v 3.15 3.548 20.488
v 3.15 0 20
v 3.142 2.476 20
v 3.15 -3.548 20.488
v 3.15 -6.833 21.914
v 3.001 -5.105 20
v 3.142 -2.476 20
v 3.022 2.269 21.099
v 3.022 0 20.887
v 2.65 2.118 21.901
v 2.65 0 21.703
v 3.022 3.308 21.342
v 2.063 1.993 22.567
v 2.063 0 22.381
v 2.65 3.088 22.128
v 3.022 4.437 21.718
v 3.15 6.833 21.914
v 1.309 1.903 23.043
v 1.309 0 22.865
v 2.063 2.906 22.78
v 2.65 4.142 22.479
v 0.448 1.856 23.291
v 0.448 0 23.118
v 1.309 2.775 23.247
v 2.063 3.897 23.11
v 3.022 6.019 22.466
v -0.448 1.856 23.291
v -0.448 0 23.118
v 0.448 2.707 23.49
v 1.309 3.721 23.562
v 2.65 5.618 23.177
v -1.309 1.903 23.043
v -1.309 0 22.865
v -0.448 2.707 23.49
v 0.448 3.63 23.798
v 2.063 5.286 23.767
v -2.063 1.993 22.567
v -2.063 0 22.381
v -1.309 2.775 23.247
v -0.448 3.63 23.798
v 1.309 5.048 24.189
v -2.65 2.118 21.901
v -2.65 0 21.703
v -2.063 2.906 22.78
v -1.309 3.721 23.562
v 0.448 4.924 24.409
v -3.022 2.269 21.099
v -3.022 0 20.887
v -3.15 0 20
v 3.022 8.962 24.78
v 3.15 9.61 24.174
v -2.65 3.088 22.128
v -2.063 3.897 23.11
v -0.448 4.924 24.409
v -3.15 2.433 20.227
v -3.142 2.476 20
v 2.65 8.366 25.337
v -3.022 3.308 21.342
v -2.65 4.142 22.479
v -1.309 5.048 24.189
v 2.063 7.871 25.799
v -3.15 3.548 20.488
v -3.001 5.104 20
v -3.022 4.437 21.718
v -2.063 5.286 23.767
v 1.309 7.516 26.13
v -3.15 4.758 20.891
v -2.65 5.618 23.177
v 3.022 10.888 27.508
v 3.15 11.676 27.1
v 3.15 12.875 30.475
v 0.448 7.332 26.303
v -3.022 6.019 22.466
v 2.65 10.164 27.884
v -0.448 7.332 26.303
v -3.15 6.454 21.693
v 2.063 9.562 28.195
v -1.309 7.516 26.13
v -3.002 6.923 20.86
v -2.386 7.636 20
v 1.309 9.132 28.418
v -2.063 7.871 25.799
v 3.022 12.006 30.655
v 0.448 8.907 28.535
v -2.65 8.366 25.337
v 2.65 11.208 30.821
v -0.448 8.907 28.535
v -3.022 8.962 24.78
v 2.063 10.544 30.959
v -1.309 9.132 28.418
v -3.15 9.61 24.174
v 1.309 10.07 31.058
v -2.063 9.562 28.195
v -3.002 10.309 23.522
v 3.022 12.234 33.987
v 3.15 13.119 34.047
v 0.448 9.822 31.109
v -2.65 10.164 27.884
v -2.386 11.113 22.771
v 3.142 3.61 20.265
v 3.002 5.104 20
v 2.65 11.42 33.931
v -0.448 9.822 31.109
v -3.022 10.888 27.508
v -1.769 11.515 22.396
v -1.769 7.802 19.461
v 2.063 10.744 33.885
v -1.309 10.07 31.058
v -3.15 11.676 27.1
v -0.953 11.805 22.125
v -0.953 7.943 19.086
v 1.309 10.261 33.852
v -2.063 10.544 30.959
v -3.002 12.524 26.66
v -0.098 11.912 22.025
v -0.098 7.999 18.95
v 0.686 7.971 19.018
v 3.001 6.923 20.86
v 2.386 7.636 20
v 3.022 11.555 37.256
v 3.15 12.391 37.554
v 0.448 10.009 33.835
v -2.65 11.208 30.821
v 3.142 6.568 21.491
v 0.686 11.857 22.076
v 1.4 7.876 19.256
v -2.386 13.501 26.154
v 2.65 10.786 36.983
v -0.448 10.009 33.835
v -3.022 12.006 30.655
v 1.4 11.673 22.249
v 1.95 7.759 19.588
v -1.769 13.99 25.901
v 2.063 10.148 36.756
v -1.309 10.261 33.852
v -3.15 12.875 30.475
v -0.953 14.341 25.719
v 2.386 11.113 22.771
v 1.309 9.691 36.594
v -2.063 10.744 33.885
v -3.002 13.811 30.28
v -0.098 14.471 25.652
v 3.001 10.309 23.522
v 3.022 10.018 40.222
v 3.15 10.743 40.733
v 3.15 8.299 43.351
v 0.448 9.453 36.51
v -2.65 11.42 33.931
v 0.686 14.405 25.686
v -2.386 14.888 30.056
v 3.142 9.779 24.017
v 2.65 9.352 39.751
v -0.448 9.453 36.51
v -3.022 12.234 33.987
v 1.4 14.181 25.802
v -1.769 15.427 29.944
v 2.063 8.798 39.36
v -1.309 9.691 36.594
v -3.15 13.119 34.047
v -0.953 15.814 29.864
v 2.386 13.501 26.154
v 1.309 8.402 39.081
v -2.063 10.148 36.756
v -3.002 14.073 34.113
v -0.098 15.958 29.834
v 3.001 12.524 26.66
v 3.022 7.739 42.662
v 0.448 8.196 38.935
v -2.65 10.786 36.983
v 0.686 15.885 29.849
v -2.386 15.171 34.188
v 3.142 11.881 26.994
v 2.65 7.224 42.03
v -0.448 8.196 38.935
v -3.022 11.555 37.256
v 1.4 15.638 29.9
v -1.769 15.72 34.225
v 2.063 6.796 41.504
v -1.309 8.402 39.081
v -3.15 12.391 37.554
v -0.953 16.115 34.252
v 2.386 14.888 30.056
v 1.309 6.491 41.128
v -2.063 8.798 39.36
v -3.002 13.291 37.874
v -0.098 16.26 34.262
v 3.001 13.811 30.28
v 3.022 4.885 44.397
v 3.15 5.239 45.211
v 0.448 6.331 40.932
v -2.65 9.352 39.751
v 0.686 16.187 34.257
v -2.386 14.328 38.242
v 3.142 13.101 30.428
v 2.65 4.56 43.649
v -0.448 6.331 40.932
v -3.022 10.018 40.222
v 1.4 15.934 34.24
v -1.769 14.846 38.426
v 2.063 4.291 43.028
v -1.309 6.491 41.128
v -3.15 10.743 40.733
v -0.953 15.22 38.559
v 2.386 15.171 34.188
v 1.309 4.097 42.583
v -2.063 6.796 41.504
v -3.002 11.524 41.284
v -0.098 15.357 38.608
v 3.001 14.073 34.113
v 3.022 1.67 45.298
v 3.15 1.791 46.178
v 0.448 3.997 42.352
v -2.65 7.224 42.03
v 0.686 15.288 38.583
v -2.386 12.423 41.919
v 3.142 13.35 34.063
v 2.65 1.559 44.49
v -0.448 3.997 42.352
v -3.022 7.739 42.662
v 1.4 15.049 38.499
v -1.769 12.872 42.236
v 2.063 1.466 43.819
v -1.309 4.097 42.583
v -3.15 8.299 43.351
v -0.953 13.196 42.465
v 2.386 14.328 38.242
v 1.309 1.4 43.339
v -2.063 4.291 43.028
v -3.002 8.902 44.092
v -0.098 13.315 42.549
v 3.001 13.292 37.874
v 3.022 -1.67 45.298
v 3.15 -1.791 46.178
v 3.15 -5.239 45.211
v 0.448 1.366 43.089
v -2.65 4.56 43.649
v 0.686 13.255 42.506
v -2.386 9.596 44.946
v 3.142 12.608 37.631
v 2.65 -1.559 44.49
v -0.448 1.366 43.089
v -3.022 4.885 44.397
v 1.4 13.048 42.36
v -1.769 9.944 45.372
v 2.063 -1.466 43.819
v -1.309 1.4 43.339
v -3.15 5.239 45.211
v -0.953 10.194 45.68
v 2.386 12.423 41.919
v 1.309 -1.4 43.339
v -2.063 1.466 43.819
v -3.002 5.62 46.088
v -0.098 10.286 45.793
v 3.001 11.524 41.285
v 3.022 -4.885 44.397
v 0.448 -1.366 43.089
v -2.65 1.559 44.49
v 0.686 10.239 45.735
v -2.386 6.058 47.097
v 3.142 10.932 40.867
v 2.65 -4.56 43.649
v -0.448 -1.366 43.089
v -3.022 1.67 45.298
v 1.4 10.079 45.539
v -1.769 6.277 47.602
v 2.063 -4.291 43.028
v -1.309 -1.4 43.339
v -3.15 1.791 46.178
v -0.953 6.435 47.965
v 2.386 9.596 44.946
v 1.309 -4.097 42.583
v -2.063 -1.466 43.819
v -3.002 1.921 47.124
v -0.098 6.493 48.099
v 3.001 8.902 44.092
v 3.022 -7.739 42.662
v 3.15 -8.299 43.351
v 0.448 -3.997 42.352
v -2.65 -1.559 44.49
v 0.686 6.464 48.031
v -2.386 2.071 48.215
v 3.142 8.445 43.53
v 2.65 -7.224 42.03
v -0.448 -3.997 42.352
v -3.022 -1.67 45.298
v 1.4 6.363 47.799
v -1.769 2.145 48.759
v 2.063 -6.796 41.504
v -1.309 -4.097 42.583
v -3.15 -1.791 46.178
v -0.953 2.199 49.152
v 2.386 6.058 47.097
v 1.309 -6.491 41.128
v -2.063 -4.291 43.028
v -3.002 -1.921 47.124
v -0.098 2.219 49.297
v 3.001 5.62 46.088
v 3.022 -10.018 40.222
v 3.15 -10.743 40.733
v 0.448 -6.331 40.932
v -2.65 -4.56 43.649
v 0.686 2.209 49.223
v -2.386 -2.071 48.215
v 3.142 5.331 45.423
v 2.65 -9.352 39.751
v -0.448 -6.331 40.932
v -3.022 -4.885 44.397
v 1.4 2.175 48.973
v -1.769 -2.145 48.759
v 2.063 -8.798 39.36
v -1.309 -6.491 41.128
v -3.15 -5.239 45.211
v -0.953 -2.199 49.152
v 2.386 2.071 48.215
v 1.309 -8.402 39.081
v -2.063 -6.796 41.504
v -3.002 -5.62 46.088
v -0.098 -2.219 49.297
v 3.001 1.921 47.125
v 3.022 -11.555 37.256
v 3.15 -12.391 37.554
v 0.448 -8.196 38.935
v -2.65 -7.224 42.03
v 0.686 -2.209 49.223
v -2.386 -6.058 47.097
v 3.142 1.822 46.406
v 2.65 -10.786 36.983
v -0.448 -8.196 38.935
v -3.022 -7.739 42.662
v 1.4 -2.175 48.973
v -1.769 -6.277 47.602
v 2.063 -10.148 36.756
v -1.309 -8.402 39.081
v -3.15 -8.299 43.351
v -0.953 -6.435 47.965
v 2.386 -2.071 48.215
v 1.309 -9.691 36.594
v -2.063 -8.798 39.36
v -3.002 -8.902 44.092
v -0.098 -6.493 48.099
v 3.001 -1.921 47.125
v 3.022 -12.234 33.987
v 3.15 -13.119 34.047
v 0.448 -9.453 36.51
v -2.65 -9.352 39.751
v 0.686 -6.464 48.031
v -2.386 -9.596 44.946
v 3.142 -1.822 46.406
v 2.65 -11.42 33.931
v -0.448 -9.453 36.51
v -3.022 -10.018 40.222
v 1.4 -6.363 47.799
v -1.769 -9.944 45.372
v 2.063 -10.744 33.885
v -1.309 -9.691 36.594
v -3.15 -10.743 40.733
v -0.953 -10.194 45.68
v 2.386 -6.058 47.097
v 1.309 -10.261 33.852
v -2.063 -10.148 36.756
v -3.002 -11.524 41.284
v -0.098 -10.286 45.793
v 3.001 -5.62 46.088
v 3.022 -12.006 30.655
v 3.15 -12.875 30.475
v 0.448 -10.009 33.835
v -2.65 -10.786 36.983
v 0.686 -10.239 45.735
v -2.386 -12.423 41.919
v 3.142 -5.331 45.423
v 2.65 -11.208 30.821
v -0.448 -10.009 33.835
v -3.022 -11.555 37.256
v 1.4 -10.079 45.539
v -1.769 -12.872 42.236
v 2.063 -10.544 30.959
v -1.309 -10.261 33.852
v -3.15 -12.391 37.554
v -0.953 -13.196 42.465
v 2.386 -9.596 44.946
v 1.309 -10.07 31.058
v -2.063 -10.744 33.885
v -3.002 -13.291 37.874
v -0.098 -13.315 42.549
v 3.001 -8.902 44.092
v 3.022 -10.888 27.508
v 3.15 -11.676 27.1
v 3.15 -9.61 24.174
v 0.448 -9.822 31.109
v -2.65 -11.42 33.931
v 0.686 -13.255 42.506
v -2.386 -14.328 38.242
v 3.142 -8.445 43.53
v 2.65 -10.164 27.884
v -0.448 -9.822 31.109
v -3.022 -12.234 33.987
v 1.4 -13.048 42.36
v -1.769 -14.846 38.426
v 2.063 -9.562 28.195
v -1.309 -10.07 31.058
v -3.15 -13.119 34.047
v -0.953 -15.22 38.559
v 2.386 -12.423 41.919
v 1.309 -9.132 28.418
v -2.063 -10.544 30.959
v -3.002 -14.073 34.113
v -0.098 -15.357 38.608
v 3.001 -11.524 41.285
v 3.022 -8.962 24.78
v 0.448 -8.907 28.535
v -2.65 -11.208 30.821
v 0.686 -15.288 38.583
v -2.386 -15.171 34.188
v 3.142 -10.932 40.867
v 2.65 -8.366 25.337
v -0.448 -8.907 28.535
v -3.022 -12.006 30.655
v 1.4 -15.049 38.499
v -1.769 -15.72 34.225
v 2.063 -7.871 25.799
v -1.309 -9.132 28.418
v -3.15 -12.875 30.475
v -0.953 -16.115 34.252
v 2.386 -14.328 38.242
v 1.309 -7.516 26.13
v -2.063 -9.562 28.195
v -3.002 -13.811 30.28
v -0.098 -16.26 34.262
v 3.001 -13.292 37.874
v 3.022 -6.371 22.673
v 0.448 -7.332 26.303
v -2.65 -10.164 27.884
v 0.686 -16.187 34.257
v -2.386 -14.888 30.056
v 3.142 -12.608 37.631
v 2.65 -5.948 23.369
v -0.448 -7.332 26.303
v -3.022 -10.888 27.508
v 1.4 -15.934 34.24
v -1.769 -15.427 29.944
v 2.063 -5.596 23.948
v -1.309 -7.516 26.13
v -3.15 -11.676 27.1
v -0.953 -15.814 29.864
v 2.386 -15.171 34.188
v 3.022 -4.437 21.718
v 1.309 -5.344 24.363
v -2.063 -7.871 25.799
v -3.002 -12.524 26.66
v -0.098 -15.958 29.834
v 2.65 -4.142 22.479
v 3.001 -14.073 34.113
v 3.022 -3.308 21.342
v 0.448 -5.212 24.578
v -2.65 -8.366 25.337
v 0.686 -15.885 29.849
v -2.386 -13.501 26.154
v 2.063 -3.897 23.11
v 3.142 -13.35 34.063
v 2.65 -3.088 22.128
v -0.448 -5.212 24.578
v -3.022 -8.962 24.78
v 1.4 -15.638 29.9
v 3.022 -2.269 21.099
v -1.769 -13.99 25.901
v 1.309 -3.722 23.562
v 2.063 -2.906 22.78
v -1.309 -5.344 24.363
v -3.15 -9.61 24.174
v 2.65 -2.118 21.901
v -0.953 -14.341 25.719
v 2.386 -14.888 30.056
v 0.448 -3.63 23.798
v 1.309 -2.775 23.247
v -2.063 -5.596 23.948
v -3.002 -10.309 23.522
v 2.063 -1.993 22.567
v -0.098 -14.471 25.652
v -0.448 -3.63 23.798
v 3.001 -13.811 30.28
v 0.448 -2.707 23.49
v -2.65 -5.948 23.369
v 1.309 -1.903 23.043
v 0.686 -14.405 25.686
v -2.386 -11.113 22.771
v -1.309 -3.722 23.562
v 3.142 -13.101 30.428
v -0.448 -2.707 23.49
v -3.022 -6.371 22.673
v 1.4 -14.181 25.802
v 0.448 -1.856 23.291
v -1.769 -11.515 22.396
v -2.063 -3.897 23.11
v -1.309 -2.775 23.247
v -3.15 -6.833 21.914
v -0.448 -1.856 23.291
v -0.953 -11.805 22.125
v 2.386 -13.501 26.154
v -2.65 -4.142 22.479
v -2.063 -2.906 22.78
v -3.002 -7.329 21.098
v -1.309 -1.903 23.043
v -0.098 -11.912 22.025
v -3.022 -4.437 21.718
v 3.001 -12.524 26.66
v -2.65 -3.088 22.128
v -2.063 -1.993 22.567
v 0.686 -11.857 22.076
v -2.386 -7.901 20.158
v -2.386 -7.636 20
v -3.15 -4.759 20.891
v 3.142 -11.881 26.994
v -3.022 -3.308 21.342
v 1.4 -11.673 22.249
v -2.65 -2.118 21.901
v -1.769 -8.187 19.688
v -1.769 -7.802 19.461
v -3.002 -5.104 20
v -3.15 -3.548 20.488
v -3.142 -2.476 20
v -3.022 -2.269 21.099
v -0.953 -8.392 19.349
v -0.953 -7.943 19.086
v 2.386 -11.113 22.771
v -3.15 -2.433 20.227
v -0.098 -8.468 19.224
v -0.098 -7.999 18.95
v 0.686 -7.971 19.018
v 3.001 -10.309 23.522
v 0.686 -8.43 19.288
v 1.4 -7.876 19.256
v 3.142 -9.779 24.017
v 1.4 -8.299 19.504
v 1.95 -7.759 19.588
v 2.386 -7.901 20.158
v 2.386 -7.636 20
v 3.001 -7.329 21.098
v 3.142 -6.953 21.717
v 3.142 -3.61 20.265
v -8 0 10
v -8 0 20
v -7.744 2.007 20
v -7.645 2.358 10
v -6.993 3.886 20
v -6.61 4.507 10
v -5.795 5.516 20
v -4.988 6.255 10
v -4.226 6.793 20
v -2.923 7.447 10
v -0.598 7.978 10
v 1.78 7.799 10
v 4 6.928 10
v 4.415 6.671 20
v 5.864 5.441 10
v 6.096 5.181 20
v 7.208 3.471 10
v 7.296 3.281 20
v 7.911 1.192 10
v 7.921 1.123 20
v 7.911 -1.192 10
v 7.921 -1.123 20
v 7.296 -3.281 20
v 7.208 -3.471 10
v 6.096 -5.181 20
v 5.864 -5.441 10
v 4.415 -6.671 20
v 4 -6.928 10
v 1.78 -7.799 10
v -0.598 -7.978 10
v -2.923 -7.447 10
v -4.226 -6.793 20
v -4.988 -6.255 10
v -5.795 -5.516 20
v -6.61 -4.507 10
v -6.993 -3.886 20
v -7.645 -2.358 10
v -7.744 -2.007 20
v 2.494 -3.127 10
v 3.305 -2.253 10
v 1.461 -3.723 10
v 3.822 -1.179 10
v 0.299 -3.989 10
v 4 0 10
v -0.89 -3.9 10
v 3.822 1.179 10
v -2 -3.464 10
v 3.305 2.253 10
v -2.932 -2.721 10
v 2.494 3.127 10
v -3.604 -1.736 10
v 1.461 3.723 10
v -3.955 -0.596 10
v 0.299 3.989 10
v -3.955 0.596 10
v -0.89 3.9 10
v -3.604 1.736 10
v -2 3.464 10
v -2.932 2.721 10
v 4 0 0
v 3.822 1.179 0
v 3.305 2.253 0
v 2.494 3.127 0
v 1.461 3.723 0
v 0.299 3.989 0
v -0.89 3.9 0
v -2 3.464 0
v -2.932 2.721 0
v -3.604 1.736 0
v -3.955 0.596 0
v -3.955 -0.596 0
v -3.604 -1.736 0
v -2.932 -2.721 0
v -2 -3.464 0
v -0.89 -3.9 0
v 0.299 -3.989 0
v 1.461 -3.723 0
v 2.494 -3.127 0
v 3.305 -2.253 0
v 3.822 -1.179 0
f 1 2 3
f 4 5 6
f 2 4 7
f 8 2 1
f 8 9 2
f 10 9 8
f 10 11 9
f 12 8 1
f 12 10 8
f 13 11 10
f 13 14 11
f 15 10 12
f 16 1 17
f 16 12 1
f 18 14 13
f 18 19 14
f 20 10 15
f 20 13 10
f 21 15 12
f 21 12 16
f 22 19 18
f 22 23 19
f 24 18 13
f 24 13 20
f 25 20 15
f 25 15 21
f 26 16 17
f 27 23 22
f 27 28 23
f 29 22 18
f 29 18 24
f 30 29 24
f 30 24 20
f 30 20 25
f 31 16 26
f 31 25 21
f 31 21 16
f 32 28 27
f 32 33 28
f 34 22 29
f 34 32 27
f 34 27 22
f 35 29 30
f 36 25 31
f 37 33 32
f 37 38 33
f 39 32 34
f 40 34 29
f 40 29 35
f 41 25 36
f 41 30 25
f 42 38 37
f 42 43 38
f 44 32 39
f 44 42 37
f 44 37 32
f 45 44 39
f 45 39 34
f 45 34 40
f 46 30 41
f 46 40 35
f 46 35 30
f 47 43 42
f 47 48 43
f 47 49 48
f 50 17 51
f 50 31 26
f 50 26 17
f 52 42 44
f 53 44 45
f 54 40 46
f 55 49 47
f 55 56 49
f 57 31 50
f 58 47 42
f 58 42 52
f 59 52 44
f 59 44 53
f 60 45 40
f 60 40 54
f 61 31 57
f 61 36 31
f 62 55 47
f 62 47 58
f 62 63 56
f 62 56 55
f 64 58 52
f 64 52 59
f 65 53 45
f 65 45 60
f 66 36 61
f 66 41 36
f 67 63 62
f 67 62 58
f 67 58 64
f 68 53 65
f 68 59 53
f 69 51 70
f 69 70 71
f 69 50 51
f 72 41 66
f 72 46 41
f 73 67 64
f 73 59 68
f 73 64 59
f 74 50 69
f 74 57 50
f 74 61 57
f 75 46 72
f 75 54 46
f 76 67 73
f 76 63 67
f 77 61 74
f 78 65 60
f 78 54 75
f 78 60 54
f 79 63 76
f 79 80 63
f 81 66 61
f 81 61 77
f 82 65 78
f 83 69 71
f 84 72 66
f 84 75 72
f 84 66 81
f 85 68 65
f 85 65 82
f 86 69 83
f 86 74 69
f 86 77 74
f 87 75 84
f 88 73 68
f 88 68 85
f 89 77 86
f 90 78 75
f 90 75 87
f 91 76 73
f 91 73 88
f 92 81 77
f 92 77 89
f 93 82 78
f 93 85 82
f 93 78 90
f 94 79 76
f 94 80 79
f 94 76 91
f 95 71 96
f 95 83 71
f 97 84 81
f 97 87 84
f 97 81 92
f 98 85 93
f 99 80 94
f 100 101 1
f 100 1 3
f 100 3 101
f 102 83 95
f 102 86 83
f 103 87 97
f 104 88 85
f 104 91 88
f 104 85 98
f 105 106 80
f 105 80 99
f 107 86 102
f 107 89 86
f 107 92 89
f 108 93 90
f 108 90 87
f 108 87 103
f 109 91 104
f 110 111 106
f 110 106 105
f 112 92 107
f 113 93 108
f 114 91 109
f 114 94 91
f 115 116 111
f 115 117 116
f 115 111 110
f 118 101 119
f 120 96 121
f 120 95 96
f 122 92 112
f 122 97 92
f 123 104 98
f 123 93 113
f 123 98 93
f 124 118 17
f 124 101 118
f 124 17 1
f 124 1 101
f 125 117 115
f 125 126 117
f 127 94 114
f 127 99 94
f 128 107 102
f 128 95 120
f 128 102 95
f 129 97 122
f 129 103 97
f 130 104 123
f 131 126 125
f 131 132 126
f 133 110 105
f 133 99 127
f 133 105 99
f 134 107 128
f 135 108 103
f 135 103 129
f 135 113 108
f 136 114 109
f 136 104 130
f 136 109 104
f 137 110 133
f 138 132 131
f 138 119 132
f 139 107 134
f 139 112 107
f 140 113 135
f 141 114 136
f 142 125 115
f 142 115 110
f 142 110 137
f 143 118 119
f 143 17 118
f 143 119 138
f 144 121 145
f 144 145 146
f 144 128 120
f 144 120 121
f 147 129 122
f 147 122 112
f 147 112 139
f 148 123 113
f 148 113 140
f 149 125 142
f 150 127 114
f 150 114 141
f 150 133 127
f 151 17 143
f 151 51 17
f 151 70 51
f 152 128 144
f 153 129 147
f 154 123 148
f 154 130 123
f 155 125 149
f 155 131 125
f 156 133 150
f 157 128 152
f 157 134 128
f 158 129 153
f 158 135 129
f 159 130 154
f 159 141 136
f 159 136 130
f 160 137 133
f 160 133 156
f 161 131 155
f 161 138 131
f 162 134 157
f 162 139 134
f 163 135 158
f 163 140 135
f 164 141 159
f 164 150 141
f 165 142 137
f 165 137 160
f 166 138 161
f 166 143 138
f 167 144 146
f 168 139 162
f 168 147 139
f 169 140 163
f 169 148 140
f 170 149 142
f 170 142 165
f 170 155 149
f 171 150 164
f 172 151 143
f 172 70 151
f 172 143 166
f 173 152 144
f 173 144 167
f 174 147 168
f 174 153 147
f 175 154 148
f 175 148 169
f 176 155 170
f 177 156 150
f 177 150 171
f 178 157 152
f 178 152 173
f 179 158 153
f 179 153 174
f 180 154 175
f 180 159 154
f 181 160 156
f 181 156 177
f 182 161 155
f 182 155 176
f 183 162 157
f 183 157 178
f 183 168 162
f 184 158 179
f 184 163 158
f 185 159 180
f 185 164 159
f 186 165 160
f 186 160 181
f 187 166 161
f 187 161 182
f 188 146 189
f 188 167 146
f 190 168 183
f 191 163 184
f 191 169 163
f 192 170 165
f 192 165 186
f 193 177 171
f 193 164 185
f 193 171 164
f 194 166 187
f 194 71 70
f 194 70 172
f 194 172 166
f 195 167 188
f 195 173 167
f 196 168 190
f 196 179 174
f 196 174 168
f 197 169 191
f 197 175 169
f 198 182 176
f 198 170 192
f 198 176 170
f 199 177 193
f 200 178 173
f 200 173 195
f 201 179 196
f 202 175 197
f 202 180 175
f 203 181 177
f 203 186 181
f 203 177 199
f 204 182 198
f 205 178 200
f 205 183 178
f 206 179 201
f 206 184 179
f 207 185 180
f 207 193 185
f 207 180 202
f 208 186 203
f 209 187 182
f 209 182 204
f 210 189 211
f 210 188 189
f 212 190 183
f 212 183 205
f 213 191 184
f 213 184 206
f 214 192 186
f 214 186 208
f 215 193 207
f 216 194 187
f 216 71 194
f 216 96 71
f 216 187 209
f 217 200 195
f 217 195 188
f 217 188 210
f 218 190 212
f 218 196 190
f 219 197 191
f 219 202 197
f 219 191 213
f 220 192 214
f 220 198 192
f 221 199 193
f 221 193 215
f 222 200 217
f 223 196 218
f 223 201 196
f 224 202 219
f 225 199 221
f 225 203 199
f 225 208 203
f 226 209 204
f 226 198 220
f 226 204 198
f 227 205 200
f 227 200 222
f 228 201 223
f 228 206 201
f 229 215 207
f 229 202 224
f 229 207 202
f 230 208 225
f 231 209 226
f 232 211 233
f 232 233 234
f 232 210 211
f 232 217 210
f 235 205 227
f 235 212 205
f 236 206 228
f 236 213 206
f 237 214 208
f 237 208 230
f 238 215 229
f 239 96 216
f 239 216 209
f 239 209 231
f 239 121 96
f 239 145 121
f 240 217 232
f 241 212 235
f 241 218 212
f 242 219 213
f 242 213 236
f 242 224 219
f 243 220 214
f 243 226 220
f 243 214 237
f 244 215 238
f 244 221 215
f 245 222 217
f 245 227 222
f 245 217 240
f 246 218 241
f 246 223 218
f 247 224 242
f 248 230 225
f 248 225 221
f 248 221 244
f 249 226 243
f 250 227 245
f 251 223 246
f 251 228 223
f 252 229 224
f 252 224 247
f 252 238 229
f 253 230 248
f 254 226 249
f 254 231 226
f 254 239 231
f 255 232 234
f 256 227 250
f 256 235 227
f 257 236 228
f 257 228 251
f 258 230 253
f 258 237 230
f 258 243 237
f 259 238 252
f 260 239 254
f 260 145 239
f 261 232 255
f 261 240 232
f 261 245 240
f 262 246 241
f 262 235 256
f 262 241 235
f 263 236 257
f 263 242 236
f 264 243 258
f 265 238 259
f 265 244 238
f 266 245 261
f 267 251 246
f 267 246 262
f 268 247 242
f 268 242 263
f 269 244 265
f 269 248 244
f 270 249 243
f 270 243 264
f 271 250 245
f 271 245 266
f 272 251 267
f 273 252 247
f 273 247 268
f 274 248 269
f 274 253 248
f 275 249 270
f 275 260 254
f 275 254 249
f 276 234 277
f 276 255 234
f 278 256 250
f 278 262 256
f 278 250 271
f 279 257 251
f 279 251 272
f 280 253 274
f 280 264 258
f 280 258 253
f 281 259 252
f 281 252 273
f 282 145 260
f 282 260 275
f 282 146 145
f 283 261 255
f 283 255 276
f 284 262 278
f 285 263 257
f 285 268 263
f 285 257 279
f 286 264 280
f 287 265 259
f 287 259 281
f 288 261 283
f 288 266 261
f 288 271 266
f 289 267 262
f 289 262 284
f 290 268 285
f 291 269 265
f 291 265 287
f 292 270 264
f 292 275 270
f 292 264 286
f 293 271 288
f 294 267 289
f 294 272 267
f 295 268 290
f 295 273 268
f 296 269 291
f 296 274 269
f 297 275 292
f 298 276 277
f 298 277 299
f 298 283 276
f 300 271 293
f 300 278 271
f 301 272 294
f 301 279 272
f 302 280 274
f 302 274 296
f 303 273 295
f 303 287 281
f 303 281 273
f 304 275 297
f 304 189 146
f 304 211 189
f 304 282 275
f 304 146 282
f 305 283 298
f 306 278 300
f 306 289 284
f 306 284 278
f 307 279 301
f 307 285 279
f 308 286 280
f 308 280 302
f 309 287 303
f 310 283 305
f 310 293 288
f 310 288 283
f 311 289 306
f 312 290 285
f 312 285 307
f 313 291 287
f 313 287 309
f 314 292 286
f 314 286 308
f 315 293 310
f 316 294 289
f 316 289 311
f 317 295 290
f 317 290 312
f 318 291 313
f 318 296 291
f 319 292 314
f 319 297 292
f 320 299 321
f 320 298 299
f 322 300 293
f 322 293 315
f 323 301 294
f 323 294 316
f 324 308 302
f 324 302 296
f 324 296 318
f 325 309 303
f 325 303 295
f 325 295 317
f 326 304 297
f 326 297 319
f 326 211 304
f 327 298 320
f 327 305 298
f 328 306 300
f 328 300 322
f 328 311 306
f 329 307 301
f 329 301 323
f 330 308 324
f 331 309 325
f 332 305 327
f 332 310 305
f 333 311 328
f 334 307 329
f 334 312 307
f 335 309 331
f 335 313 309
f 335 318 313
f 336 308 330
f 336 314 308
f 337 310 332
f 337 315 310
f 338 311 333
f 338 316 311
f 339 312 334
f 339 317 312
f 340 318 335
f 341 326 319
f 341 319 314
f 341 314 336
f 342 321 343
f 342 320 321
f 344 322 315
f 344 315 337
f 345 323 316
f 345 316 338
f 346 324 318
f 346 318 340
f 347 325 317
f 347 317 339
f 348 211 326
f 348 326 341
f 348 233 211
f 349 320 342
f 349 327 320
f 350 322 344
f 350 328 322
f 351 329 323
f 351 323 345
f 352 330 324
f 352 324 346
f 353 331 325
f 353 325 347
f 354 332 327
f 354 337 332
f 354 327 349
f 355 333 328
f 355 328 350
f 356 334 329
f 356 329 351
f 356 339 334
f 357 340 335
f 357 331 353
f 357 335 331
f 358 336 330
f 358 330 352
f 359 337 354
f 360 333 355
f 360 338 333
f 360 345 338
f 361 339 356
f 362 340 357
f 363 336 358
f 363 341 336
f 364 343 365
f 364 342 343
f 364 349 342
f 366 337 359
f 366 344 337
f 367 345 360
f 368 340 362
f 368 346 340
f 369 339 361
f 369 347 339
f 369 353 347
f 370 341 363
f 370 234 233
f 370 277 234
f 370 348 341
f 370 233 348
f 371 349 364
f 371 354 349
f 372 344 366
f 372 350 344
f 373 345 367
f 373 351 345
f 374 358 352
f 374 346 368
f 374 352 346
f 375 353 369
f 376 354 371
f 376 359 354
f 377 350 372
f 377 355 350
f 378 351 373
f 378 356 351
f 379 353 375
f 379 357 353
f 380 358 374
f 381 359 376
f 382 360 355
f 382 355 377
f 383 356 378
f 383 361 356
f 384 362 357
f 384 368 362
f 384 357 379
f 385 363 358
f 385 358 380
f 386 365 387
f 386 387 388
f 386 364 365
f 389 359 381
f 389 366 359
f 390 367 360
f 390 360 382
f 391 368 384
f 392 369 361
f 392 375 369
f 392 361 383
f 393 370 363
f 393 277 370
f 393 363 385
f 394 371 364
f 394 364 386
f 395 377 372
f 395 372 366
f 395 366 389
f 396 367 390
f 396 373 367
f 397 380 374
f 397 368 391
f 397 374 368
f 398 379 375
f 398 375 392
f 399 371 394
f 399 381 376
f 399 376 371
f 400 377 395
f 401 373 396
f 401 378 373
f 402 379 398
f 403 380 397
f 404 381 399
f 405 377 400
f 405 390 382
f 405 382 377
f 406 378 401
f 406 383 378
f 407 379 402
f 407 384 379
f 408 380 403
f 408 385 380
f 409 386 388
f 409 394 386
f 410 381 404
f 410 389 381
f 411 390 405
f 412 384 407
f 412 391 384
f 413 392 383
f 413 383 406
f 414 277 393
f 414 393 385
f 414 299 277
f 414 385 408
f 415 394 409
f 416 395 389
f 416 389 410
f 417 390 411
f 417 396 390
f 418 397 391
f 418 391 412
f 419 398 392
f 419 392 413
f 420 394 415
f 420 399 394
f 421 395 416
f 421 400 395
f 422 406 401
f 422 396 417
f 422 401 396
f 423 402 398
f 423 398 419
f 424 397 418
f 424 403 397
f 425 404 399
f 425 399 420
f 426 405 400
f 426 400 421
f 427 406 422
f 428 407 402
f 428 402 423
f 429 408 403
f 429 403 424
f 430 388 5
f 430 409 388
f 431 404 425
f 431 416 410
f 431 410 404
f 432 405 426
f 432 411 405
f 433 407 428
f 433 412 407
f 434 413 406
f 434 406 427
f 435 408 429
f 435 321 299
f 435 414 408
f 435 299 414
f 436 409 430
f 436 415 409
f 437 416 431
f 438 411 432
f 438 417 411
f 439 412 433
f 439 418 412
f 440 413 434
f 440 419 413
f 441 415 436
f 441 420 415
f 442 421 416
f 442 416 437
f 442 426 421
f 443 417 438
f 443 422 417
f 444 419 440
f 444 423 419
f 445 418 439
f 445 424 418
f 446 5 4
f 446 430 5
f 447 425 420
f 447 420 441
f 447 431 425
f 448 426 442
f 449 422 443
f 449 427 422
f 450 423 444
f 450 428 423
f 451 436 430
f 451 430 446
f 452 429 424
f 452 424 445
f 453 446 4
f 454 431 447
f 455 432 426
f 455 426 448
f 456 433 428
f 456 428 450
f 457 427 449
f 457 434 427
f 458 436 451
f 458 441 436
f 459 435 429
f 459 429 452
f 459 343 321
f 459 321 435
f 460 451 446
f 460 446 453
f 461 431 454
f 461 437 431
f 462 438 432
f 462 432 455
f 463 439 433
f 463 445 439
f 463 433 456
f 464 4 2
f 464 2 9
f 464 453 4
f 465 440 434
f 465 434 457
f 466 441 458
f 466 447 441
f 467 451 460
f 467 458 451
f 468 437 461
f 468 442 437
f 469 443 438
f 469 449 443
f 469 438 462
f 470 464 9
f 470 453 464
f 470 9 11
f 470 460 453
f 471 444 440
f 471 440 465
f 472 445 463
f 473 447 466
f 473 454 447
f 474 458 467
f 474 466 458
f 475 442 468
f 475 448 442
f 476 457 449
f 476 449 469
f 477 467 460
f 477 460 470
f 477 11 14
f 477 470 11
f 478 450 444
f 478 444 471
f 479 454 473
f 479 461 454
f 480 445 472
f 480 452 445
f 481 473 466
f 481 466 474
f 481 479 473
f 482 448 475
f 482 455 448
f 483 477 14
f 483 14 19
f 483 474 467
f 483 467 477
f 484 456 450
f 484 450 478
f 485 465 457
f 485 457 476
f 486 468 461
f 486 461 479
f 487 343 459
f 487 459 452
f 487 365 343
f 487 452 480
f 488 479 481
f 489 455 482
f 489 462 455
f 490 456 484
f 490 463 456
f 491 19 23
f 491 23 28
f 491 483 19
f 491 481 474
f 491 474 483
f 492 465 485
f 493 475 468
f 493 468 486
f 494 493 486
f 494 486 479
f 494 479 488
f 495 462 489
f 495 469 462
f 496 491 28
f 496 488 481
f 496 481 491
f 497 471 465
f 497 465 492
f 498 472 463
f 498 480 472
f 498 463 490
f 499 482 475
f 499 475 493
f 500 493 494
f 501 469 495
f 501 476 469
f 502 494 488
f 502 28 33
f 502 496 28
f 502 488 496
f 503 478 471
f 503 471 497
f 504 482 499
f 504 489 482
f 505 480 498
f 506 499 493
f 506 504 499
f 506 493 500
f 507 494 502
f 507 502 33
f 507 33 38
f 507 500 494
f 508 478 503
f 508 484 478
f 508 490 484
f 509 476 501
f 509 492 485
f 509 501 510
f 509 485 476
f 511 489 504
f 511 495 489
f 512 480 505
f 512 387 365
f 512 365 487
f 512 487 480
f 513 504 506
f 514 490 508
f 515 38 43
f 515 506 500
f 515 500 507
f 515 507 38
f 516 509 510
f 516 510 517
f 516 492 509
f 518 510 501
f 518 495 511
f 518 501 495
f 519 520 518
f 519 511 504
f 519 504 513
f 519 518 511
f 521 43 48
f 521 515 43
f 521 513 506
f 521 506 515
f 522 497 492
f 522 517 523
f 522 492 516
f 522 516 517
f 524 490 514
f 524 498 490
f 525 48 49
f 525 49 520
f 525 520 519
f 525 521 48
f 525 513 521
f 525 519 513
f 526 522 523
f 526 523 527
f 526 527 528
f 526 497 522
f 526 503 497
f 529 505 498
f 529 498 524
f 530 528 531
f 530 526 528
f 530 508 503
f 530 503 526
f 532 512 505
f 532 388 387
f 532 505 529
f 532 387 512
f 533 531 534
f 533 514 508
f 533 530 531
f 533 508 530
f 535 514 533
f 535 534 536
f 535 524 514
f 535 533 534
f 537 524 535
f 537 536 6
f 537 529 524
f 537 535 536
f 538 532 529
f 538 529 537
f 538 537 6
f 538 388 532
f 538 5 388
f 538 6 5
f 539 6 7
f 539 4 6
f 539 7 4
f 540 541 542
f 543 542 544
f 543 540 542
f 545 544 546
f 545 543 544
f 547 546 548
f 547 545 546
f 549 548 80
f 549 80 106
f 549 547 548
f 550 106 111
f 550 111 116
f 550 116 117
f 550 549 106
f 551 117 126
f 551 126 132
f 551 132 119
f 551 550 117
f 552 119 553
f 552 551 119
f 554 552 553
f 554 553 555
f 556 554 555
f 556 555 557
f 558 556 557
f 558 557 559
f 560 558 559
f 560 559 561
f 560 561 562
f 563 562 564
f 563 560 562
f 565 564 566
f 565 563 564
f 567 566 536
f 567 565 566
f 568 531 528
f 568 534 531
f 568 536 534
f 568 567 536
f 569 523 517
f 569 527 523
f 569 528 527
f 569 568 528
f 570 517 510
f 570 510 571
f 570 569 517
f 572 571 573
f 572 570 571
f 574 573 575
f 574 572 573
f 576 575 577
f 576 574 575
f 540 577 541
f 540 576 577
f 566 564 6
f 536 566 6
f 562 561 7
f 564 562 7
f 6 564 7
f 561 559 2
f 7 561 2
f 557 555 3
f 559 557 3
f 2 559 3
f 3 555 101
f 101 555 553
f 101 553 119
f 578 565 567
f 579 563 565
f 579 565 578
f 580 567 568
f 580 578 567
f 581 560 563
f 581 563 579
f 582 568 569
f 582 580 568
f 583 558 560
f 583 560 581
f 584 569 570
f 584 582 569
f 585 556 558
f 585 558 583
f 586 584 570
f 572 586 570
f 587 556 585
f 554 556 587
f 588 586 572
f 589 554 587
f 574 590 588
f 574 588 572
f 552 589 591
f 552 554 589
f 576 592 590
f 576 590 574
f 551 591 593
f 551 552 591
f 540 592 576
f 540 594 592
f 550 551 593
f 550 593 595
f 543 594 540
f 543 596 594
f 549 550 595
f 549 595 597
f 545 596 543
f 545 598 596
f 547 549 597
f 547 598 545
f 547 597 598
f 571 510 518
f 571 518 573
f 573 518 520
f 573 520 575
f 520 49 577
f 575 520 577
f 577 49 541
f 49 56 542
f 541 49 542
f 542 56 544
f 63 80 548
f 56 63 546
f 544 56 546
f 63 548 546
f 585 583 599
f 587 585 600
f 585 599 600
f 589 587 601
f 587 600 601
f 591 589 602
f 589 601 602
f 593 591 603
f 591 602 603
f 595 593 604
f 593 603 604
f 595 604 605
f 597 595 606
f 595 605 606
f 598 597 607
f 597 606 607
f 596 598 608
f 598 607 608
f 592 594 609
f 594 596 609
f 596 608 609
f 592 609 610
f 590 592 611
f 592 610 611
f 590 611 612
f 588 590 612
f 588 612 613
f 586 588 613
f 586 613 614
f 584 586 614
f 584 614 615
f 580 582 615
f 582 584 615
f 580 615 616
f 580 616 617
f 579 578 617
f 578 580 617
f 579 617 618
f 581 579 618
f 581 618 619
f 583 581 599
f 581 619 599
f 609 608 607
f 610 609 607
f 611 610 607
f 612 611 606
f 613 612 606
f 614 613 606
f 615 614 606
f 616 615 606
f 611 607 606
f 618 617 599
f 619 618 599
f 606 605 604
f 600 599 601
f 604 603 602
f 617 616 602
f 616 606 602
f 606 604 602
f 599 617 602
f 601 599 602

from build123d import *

# Parameters (mm, degrees)
SKETCH_1_R      = 4
EXTRUDE_1_DEPTH = 20
SKETCH_2_R      = 3.15
SKETCH_4_R      = 8
EXTRUDE_2_DEPTH = 5


with BuildPart() as part:
    # ｽｹｯﾁ1 → ﾎﾞｽ - 押し出し1 (new body)
    with BuildSketch(Plane.XY):
        Circle(SKETCH_1_R)
    extrude(amount=EXTRUDE_1_DEPTH)

    # ｽｲｰﾌﾟ1: sweep along a path in ｽｹｯﾁ3
    with BuildLine(Plane(origin=(0, 0, 0), x_dir=(0, 0, -1), z_dir=(1, 0, 0))) as sweep_1_path:
        CenterArc((-33.15, 0), 13.15, 0, 360)
    # ｽｹｯﾁ2 → ｽｲｰﾌﾟ1 (sweep)
    with BuildSketch(Plane(origin=(0, 0, 0), x_dir=(1, 0, 0), z_dir=(0, 1, 0))):
        with Locations((0, -20)):
            Circle(SKETCH_2_R)
    sweep(path=sweep_1_path.line)

    # ｽｹｯﾁ4 → ﾎﾞｽ - 押し出し2 (add, symmetric)
    with BuildSketch(Plane(origin=(0, 0, 15), x_dir=(-1, 0, 0), z_dir=(0, 0, -1))):
        Circle(SKETCH_4_R)
    extrude(amount=EXTRUDE_2_DEPTH, both=True)


solid = part.part
